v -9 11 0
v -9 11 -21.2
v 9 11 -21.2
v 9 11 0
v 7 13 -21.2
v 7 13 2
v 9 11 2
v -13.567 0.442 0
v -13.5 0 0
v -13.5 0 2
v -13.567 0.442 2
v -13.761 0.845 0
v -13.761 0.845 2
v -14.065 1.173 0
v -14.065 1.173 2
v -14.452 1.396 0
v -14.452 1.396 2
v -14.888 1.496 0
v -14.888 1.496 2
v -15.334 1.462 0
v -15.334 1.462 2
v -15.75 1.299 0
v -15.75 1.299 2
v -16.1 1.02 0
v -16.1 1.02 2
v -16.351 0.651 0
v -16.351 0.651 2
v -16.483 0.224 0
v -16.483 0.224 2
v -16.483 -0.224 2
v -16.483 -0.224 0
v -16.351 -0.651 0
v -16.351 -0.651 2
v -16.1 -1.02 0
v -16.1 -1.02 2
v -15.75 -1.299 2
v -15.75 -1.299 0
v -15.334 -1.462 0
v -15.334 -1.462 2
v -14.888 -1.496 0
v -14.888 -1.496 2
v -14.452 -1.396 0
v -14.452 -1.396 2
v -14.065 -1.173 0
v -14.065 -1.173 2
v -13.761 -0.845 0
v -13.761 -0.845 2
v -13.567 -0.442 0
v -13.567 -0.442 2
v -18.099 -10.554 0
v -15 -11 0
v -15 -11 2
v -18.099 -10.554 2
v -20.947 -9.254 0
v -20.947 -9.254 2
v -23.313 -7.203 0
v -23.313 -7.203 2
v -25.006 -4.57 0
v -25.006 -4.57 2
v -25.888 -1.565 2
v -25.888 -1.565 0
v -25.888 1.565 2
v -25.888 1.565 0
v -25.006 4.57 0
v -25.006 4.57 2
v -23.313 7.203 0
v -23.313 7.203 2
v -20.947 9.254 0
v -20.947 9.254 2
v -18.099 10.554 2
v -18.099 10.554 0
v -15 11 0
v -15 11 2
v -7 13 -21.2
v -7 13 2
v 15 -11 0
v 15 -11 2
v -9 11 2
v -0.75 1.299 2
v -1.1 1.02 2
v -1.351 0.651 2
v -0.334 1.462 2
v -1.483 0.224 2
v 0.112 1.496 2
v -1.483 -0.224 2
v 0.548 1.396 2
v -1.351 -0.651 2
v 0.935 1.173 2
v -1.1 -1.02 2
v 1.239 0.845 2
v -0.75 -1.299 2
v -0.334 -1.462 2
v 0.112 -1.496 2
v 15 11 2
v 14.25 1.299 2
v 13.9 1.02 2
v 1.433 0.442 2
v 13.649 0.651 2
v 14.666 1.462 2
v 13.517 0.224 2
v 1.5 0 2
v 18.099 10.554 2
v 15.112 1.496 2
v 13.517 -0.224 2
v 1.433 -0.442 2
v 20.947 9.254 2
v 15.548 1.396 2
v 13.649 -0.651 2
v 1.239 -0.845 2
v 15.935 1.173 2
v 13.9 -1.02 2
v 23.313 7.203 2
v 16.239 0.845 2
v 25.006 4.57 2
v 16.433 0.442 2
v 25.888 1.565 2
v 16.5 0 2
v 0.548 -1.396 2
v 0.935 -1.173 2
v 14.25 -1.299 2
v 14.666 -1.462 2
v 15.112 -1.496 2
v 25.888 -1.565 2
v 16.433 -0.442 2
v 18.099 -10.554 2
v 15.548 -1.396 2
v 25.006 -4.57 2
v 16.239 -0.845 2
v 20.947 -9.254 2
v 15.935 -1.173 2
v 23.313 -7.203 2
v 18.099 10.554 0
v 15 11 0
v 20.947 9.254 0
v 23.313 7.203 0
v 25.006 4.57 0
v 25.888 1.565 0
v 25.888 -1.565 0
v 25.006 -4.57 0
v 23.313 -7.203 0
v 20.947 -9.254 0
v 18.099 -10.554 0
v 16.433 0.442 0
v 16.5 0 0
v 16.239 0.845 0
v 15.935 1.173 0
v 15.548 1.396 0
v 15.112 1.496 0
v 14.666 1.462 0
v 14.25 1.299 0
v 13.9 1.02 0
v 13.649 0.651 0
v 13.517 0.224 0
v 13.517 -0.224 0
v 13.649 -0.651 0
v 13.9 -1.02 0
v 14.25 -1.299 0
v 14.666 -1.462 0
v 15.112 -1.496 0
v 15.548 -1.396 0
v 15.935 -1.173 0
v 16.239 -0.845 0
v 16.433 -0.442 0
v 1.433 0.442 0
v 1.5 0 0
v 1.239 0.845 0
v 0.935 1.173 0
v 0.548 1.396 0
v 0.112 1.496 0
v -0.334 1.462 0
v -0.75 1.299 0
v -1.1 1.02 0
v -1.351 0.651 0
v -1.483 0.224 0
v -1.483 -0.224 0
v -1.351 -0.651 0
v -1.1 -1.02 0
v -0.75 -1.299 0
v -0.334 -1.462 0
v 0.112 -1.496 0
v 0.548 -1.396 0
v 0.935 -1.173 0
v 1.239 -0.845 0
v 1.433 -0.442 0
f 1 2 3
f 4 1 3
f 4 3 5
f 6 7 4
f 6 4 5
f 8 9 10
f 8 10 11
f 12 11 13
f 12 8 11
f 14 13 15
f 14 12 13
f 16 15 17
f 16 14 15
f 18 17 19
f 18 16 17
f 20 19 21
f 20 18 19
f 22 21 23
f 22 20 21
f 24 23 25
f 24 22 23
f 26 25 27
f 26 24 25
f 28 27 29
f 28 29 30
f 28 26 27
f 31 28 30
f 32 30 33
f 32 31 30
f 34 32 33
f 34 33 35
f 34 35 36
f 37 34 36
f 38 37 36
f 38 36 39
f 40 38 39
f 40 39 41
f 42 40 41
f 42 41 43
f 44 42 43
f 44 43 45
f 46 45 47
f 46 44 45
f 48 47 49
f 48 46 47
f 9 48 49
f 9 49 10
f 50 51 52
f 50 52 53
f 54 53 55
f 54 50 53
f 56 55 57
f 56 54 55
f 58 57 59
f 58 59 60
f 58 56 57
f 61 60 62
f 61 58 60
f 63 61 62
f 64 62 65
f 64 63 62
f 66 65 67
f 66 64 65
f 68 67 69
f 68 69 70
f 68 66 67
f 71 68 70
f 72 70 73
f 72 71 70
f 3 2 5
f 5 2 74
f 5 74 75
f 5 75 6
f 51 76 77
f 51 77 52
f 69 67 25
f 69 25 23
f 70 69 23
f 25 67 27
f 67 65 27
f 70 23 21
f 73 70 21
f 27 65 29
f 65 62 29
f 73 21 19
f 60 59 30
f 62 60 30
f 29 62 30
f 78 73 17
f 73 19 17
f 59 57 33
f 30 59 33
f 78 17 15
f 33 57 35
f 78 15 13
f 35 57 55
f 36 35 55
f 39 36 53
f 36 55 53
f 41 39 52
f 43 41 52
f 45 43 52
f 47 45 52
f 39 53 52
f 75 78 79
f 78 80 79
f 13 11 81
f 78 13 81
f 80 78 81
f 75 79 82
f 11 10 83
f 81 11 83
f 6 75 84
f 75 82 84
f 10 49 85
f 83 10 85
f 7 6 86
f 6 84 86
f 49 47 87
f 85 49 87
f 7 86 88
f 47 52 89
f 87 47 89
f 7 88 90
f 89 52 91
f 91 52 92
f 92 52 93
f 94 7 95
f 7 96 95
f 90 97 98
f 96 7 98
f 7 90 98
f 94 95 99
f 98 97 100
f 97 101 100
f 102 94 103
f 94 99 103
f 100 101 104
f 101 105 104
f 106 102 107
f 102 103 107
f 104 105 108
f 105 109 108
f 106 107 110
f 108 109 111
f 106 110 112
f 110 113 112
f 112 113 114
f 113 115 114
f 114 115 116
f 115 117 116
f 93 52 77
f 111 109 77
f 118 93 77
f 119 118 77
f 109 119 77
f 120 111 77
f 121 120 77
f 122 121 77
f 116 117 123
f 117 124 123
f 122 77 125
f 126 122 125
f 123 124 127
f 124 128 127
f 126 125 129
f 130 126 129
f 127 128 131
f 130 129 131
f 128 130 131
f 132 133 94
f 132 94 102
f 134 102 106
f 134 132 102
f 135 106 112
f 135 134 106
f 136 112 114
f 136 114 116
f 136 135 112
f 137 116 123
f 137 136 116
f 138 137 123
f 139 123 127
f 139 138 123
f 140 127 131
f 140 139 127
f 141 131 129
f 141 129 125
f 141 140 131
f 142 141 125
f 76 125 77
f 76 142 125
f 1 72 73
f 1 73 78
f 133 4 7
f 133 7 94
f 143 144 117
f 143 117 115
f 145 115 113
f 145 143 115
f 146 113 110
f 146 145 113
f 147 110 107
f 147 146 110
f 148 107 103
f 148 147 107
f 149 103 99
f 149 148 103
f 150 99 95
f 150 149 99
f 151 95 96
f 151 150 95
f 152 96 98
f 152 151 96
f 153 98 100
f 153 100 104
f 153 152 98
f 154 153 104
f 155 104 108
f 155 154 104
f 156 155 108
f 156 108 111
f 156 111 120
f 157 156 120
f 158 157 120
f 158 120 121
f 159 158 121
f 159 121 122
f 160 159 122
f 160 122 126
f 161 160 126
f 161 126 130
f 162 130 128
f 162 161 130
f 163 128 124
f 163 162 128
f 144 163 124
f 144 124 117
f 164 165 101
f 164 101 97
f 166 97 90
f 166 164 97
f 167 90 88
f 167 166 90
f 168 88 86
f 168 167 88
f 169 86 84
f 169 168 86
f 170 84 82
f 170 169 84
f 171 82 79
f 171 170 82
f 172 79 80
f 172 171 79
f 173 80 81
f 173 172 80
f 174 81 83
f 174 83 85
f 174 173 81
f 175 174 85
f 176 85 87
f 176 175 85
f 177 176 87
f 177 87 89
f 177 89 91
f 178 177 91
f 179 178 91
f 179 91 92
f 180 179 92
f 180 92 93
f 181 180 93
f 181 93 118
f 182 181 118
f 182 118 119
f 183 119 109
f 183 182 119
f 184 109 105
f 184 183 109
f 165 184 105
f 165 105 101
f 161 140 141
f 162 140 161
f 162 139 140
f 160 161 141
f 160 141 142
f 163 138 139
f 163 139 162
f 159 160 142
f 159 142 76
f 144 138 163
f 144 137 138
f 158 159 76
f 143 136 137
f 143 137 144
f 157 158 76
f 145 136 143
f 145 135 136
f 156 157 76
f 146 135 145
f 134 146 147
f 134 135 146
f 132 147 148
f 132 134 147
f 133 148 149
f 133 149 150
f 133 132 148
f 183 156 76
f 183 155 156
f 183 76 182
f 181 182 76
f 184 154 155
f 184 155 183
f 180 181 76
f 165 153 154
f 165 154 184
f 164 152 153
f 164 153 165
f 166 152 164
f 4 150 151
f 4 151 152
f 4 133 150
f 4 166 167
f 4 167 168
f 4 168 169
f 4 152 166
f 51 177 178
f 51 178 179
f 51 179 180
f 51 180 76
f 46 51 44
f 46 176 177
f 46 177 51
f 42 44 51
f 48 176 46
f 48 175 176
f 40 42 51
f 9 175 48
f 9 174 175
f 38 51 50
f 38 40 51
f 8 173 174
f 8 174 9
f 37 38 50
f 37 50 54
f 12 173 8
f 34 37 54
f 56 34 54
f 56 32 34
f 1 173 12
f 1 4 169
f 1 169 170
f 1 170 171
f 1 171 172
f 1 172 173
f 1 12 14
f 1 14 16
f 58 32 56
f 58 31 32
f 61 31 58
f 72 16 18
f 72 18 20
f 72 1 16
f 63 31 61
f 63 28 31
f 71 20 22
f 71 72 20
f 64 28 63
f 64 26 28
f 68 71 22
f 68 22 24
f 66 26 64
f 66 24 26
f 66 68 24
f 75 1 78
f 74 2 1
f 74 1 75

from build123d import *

# Parameters (mm, degrees)
SKETCH1_R           = 1.5
BOSS_EXTRUDE1_DEPTH = 2
SKETCH2_W           = 18
SKETCH2_H           = 23.2
BOSS_EXTRUDE2_DEPTH = 2
CHAMFER1_SIZE       = 2


with BuildPart() as part:
    # Sketch1 → Boss-Extrude1 (new body)
    with BuildSketch(Plane.XY):
        with BuildLine():
            Line((-15, 11), (15, 11))
            ThreePointArc((15, 11), (26, 0), (15, -11))
            Line((15, -11), (-15, -11))
            ThreePointArc((-15, -11), (-26, 0), (-15, 11))
        make_face()
        with Locations((-15, 0)):
            Circle(SKETCH1_R, mode=Mode.SUBTRACT)
        with Locations((15, 0)):
            Circle(SKETCH1_R, mode=Mode.SUBTRACT)
        Circle(SKETCH1_R, mode=Mode.SUBTRACT)
    extrude(amount=BOSS_EXTRUDE1_DEPTH)

    # Sketch2 → Boss-Extrude2 (add)
    with BuildSketch(Plane(origin=(0, 11, 0), x_dir=(1, 0, 0), z_dir=(0, 1, 0))):
        with Locations((0, 9.6)):
            Rectangle(SKETCH2_W, SKETCH2_H)
    extrude(amount=BOSS_EXTRUDE2_DEPTH)

    # Chamfer1
    # the kernel refuses this chamfer: 2 mm, written as the material it takes off along each edge
    with BuildSketch(Plane(origin=(-9, 13, -26.343365976), x_dir=(-0.027495876610586487, -0.9996219169112968, 0), z_dir=(0, 0, 1)), Plane(origin=(9, 13, 7.143365976), x_dir=(0.027495876610586487, -0.9996219169112968, 0), z_dir=(0, 0, -1))) as chamfer1_piece_1:
        Polygon((CHAMFER1_SIZE * 0.999621916911, CHAMFER1_SIZE * 0.0274958766106), (-CHAMFER1_SIZE * 0.0274958766106, CHAMFER1_SIZE * 0.999621916911), (0, 0), align=None)
    extrude(amount=33.486731952, mode=Mode.SUBTRACT)


solid = part.part
